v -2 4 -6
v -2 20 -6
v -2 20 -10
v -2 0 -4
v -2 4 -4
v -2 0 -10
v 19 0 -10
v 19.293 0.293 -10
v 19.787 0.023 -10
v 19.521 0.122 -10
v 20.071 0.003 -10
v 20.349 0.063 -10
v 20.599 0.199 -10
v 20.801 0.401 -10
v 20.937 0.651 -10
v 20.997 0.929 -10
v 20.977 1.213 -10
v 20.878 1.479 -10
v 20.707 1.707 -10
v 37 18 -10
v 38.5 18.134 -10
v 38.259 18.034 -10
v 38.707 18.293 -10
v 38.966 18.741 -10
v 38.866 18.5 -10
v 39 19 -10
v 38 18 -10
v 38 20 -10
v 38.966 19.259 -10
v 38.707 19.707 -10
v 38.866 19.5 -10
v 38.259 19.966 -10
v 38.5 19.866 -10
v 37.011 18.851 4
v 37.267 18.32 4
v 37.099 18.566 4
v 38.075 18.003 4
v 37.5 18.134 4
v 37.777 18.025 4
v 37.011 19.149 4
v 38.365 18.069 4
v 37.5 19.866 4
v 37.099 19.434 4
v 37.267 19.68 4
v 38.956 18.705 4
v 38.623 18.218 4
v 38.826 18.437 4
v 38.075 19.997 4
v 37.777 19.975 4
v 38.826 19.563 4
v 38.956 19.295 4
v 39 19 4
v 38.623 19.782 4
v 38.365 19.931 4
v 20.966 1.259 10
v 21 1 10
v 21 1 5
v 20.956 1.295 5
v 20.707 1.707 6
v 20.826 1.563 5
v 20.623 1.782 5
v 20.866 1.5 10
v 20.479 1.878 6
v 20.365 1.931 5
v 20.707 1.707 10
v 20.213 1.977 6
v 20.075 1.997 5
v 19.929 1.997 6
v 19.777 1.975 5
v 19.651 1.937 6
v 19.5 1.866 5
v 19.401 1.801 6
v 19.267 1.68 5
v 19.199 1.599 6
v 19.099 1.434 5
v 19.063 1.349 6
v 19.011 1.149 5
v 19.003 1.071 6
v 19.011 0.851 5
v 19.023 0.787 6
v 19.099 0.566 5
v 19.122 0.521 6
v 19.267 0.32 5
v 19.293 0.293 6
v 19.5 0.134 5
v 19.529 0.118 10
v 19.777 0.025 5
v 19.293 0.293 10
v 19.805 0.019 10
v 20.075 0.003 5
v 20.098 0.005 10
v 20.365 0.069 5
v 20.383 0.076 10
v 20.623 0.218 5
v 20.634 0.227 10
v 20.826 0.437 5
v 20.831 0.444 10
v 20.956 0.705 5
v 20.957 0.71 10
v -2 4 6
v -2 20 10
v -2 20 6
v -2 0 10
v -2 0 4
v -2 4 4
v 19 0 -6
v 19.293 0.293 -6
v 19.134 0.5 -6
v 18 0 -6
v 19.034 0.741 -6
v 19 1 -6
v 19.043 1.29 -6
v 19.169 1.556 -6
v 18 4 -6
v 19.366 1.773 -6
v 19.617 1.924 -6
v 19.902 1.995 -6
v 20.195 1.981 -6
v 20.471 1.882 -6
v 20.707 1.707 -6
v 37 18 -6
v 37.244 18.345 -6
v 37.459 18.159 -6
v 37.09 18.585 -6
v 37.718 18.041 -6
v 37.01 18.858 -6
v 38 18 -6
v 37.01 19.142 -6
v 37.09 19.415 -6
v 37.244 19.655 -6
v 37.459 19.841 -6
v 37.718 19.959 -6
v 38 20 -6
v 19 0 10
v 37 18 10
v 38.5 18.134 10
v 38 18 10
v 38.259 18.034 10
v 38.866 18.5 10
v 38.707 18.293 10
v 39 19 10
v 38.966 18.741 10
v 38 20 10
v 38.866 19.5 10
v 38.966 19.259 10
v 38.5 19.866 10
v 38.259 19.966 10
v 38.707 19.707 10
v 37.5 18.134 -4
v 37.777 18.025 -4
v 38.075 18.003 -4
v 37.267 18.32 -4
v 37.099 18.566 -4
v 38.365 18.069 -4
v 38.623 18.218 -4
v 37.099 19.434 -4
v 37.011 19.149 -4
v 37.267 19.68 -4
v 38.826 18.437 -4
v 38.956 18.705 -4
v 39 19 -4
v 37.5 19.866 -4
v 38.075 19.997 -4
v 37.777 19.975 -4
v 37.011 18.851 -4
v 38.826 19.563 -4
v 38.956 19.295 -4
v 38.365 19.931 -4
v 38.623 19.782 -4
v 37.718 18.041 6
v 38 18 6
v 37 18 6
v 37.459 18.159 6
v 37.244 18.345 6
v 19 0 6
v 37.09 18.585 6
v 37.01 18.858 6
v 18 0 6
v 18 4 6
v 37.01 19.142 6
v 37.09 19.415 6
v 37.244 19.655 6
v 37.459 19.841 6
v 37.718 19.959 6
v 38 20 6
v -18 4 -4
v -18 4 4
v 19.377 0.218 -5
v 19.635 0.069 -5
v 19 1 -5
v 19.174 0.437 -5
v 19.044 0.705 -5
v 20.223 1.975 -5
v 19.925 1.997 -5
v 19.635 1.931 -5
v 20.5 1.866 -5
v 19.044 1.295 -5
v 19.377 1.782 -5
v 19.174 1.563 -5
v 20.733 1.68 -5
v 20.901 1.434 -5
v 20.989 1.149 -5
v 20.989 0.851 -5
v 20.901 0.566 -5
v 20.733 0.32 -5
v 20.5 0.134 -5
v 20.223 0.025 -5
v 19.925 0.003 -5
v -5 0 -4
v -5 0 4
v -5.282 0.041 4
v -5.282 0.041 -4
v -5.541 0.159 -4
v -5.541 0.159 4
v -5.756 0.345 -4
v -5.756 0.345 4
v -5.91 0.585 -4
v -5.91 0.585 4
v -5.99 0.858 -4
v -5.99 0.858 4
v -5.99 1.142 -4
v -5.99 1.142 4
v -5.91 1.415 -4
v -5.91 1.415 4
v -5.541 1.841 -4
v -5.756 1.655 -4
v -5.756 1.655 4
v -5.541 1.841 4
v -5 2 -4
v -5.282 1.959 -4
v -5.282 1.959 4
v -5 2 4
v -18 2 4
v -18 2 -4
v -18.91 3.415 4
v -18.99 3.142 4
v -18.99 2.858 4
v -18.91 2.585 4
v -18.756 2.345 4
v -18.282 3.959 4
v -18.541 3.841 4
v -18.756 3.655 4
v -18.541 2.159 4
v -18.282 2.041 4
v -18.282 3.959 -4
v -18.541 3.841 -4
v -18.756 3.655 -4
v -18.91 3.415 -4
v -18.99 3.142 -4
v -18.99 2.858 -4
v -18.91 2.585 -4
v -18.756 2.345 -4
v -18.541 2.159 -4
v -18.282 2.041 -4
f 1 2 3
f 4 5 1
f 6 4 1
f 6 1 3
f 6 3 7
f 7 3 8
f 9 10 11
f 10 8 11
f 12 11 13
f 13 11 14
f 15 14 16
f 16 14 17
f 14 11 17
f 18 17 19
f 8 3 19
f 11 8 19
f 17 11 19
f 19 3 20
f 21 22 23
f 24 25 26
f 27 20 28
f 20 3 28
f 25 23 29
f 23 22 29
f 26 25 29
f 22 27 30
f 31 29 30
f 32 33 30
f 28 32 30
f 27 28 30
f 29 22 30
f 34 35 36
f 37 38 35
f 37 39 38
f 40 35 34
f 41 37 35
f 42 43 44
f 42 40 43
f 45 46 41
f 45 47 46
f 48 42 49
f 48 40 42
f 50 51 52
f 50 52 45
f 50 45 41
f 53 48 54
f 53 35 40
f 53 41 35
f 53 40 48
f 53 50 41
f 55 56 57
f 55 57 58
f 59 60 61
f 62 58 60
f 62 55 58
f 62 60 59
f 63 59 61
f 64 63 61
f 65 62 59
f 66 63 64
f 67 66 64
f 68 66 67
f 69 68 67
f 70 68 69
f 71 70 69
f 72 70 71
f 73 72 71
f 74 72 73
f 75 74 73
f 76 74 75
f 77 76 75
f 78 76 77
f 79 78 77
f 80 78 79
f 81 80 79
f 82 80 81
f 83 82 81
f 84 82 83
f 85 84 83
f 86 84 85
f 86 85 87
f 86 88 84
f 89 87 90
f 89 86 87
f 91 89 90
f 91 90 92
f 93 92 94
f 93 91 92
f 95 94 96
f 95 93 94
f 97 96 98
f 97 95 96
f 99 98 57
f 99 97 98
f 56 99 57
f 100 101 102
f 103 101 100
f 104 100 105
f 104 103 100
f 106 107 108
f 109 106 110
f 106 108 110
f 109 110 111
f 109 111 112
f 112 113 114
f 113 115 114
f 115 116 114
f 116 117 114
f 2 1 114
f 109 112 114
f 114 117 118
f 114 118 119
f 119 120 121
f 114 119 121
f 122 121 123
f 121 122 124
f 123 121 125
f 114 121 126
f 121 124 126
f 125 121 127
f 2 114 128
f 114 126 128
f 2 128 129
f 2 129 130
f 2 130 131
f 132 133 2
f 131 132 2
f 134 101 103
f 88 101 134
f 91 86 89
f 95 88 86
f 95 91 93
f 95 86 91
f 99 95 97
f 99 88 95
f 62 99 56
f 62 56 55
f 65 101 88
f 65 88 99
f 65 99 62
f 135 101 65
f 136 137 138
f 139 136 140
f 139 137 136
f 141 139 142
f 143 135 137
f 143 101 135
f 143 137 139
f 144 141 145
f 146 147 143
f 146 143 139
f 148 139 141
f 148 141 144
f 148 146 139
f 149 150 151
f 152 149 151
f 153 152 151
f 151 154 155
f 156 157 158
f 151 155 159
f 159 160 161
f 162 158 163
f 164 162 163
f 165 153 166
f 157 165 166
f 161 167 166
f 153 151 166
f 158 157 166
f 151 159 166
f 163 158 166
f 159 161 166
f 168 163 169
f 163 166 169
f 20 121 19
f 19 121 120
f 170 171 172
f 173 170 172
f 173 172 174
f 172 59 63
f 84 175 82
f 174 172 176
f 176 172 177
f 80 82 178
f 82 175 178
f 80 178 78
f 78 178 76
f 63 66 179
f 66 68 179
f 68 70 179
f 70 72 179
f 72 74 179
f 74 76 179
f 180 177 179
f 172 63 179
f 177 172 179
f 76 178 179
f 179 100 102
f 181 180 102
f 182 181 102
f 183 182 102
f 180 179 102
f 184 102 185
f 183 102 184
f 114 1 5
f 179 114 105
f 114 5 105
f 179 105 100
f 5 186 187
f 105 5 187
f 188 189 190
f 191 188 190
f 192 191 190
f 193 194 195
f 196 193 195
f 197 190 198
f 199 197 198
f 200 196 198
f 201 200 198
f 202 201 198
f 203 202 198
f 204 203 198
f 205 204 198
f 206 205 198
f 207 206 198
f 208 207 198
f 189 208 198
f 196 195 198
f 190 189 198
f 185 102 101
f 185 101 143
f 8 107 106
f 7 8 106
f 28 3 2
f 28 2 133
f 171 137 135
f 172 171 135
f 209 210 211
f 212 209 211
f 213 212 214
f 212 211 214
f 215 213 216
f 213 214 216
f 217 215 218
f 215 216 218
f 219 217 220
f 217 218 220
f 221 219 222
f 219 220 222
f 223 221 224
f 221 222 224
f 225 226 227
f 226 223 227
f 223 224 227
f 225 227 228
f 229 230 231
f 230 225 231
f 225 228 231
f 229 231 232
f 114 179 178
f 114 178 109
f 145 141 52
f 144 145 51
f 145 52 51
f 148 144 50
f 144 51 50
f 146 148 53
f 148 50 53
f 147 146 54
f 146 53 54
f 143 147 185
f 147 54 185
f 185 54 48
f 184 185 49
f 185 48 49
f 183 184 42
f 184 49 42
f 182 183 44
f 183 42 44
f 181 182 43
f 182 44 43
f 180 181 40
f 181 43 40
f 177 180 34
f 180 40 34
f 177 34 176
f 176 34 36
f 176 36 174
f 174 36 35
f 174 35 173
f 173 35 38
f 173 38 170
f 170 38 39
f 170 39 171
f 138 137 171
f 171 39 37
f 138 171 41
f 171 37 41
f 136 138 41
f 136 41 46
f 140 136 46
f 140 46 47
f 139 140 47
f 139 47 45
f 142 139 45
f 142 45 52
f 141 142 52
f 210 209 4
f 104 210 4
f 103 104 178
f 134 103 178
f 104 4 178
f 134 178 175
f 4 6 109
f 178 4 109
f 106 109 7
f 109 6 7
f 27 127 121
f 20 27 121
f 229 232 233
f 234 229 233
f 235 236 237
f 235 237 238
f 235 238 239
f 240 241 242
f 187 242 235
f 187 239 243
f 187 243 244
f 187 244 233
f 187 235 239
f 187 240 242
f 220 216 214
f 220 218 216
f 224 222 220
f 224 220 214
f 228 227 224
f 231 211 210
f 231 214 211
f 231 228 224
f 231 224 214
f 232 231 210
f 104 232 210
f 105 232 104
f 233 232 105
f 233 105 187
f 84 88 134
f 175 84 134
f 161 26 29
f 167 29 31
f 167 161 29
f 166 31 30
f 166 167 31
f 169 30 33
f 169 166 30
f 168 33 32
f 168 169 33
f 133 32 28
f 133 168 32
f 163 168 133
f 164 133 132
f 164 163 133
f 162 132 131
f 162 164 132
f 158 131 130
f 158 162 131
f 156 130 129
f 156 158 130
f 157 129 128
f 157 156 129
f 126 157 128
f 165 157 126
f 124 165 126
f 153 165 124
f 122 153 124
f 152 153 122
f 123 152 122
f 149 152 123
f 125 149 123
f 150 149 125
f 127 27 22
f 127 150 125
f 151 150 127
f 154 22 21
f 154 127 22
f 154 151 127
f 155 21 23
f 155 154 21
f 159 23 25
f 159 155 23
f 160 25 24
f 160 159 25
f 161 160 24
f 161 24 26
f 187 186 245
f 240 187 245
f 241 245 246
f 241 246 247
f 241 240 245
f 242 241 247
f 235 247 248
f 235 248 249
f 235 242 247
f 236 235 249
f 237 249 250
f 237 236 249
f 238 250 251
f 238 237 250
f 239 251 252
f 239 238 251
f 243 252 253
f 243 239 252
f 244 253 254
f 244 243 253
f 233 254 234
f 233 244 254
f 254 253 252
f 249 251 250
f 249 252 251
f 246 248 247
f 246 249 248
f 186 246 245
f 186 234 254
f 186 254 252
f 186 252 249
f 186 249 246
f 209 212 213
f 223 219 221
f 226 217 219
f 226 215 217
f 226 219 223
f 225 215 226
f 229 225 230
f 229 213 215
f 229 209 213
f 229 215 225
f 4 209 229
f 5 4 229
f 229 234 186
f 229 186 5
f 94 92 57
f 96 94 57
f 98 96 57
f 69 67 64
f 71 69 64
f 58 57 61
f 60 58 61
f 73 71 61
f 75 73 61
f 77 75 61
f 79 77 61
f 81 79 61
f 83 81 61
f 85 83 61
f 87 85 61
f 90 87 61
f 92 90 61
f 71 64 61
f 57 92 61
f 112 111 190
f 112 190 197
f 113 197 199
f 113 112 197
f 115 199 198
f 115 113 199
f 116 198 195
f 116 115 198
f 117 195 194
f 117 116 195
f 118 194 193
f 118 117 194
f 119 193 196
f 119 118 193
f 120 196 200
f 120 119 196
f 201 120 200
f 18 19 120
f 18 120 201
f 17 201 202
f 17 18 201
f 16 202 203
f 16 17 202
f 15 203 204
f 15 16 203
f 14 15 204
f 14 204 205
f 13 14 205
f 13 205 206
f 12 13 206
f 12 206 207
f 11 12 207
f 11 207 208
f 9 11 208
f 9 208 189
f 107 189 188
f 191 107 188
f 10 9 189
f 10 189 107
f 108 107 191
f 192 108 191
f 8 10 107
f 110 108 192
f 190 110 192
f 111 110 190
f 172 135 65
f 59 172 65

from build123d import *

# Parameters (mm, degrees)
SKETCH_1_W           = 40
SKETCH_1_H           = 20
EXTRUDE_1_DEPTH      = 20
SKETCH_2_W           = 8
SKETCH_2_H           = 4
EXTRUDE_2_DEPTH      = 16
SKETCH_4_W           = 12
SKETCH_4_H           = 18.32487869
CUT_EXTRUDE_2_DEPTH  = 41
SKETCH_7_W           = 12
SKETCH_7_H           = 4
CUT_EXTRUDE_4_DEPTH  = 20
SKETCH_5_R           = 1
EXTRUDE_3_DEPTH      = 10
SKETCH_6_W           = 8
SKETCH_6_H           = 25.038569191
CUT_EXTRUDE_3_DEPTH  = 10
CUT_EXTRUDE_8_DEPTH  = 20
SKETCH_13_R          = 1
EXTRUDE_5_DEPTH      = 8
CUT_EXTRUDE_10_DEPTH = 20
SKETCH_16_R          = 1
EXTRUDE_12_DEPTH     = 5
SKETCH_17_R          = 1
EXTRUDE_13_DEPTH     = 5


with BuildPart() as part:
    # 草图1 → 凸台-拉伸1 (new body)
    with BuildSketch(Plane(origin=(0, 0, 0), x_dir=(1, 0, 0), z_dir=(0, 1, 0))):
        with Locations((18, 0)):
            Rectangle(SKETCH_1_W, SKETCH_1_H)
    extrude(amount=EXTRUDE_1_DEPTH)

    # 草图2 → 凸台-拉伸2 (add)
    with BuildSketch(Plane.ZY.offset(2)):
        with Locations((0, 2)):
            Rectangle(SKETCH_2_W, SKETCH_2_H)
    extrude(amount=EXTRUDE_2_DEPTH)

    # 草图4 → 切除-拉伸2 (cut, through all)
    with BuildSketch(Plane.ZY.offset(2)):
        with Locations((0, 13.162439345)):
            Rectangle(SKETCH_4_W, SKETCH_4_H)
    extrude(amount=-CUT_EXTRUDE_2_DEPTH, mode=Mode.SUBTRACT)

    # 草图7 → 切除-拉伸4 (cut)
    with BuildSketch(Plane(origin=(38, 0, 0), x_dir=(0, 0, -1), z_dir=(1, 0, 0))):
        with Locations((0, 2)):
            Rectangle(SKETCH_7_W, SKETCH_7_H)
    extrude(amount=-CUT_EXTRUDE_4_DEPTH, mode=Mode.SUBTRACT)

    # 草图5 → 凸台-拉伸3 (add, symmetric)
    with BuildSketch(Plane.XY):
        with Locations((38, 19)):
            Circle(SKETCH_5_R)
        with Locations((38, 1)):
            Circle(SKETCH_5_R)
    extrude(amount=EXTRUDE_3_DEPTH, both=True)

    # 草图6 → 切除-拉伸3 (cut, symmetric)
    with BuildSketch(Plane(origin=(38, 0, 0), x_dir=(0, 0, -1), z_dir=(1, 0, 0))):
        with Locations((0, 10.475013396)):
            Rectangle(SKETCH_6_W, SKETCH_6_H)
    extrude(amount=CUT_EXTRUDE_3_DEPTH, both=True, mode=Mode.SUBTRACT)

    # 草图12 → 切除-拉伸8 (cut)
    with BuildSketch(Plane.XY.offset(4)):
        with BuildLine():
            Line((-5, 2), (-18.474771325, 2))
            Line((-18.474771325, 2), (-18.474771325, 0))
            Line((-18.474771325, 0), (-5, 0))
            ThreePointArc((-5, 0), (-6, 1), (-5, 2))
        make_face()
    extrude(amount=-CUT_EXTRUDE_8_DEPTH, mode=Mode.SUBTRACT)

    # 草图13 → 凸台-拉伸5 (add)
    with BuildSketch(Plane.XY.offset(4)):
        with Locations((-18, 3)):
            Circle(SKETCH_13_R)
    extrude(amount=-EXTRUDE_5_DEPTH)

    # 草图15 → 切除-拉伸10 (cut)
    with BuildSketch(Plane.XY.offset(10)):
        Polygon((19, 0), (39.887994795, 0), (38, 18), (37, 18), align=None)
    extrude(amount=-CUT_EXTRUDE_10_DEPTH, mode=Mode.SUBTRACT)

    # 草图16 → 凸台-拉伸12 (add)
    with BuildSketch(Plane.XY.offset(10)):
        with Locations((20, 1)):
            Circle(SKETCH_16_R)
    extrude(amount=-EXTRUDE_12_DEPTH)

    # 草图17 → 凸台-拉伸13 (add)
    with BuildSketch(Plane(origin=(0, 0, -10), x_dir=(-1, 0, 0), z_dir=(0, 0, -1))):
        with Locations((-20, 1)):
            Circle(SKETCH_17_R)
    extrude(amount=-EXTRUDE_13_DEPTH)


solid = part.part
